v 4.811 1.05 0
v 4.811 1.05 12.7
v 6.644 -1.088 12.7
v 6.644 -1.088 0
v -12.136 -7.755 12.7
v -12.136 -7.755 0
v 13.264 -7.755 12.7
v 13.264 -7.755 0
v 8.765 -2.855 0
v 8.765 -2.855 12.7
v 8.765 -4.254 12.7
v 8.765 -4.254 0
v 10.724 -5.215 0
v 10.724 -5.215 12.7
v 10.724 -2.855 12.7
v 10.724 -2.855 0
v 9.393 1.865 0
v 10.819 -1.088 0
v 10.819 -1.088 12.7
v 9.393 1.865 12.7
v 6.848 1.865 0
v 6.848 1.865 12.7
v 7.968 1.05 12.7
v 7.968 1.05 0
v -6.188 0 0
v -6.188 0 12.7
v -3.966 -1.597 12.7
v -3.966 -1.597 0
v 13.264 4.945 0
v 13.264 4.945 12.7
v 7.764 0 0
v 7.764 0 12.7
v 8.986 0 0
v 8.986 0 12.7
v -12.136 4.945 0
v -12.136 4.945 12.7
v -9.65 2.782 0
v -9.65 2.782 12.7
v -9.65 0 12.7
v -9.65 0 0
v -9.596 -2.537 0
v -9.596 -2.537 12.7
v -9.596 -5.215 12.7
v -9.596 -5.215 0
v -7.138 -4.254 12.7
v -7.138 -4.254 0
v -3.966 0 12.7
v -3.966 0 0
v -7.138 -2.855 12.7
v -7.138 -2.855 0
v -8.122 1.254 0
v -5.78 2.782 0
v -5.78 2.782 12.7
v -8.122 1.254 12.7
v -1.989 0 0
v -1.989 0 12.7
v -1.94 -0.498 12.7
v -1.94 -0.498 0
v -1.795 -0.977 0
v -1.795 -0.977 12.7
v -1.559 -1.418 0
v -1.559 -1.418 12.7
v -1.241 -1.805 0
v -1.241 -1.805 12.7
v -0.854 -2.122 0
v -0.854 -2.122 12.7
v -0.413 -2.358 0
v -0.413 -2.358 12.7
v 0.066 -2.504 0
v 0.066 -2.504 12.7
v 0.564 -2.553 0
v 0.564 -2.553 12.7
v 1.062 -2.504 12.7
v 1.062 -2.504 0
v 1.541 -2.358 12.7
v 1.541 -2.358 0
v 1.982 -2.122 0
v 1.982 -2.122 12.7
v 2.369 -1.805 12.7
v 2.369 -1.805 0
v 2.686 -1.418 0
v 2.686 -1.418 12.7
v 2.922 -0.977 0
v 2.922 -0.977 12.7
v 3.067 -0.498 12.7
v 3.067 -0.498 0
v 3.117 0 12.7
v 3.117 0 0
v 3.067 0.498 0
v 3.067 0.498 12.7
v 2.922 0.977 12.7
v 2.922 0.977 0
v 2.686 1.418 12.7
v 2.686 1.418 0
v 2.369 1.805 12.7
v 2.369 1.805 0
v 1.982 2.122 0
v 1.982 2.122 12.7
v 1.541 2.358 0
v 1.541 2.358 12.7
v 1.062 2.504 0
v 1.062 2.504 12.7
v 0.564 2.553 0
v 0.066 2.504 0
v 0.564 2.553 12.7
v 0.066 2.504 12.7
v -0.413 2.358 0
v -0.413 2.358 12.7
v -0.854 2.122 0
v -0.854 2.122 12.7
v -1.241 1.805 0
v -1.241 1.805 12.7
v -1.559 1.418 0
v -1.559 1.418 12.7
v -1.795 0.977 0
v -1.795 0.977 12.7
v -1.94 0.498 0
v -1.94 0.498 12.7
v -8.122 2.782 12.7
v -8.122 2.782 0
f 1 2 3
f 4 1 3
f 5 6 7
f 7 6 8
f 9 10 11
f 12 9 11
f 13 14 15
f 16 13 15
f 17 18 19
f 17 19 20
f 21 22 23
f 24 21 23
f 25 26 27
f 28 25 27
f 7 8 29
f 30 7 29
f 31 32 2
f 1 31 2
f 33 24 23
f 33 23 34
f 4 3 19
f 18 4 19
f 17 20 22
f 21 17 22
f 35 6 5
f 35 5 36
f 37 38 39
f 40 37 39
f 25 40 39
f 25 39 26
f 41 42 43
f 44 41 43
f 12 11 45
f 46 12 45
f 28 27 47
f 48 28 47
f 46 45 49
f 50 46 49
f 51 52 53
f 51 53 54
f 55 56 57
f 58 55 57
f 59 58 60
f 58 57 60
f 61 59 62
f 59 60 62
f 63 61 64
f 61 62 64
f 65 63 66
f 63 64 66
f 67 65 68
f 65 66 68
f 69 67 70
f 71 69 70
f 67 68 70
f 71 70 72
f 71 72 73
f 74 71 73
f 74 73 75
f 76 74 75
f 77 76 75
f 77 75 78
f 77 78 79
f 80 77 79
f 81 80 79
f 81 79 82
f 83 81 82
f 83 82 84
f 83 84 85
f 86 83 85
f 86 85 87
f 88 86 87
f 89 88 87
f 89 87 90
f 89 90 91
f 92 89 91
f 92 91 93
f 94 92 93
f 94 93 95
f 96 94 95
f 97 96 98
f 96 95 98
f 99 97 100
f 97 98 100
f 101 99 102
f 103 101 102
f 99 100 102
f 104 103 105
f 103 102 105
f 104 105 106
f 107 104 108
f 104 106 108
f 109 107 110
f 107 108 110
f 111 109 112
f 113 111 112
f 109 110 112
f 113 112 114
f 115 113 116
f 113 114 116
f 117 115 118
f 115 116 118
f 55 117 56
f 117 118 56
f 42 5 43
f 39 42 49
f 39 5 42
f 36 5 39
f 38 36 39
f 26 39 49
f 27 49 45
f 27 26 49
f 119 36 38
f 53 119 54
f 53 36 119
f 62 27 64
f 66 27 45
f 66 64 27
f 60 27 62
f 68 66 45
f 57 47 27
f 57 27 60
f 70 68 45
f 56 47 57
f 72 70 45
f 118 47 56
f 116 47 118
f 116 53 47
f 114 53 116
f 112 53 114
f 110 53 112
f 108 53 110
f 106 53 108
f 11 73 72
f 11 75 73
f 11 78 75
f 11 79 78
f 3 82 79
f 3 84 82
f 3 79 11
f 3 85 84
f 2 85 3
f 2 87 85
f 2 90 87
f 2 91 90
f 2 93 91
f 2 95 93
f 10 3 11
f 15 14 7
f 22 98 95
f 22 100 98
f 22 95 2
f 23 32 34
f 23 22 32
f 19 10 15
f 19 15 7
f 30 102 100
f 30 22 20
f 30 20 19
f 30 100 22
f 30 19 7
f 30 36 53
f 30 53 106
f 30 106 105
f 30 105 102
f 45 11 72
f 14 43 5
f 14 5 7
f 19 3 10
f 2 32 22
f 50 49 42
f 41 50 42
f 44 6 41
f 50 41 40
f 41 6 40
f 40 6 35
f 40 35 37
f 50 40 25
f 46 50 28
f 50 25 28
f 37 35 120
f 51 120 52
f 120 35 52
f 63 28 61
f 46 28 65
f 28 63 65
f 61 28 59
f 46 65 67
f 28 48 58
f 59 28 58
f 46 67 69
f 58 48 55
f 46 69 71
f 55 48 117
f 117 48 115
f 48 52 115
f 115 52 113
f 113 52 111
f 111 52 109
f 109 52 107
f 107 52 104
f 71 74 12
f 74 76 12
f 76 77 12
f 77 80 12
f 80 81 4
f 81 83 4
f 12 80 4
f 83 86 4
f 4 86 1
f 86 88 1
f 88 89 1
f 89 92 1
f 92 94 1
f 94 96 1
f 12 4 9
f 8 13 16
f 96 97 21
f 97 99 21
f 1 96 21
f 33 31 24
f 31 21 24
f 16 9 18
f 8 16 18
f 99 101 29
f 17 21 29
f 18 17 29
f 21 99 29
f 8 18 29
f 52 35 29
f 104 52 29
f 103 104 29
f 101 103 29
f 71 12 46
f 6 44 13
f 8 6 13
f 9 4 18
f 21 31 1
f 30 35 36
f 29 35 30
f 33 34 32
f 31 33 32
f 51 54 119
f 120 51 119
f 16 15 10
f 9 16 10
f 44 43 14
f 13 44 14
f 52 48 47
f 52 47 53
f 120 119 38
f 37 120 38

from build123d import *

# Parameters (mm, degrees)
F0_W     = 25.4
F0_H     = 12.7
F1_DEPTH = 12.7
F3_D     = 5.1054
F5_DEPTH = 25.4
F7_DEPTH = 25.4
F9_DEPTH = 25.4


with BuildPart() as f1:
    # F0 (on Top) → F1 (new body)
    with BuildSketch(Plane.XY):
        with Locations((0.563834, -1.404666)):
            Rectangle(F0_W, F0_H)
    extrude(amount=F1_DEPTH)

    # F3 (through all)
    with Locations(Plane(origin=(0, 0, 0), x_dir=(1, 0, 0), z_dir=(0, 0, -1))):
        with Locations((0.563834, 0)):
            Hole(F3_D / 2)

    # F4 (on face) → F5 (cut)
    with BuildSketch(Plane.XY.offset(12.7)):
        Polygon((-9.596166, -2.537197), (-9.596166, -5.214666), (10.723834, -5.214666), (10.723834, -2.854676), (8.765497, -2.854676), (8.765497, -4.253724), (-7.137803, -4.253724), (-7.137803, -2.854676), align=None)
    extrude(amount=-F5_DEPTH, mode=Mode.SUBTRACT)

    # F6 (on face) → F7 (cut)
    with BuildSketch(Plane.XY.offset(12.7)):
        Polygon((-9.650016, 2.781621), (-9.650016, 0), (-6.187561, 0), (-3.966114, -1.597365), (-3.966114, 0), (-5.780214, 2.781621), (-8.122463, 1.254068), (-8.122463, 2.781621), align=None)
    extrude(amount=-F7_DEPTH, mode=Mode.SUBTRACT)

    # F8 (on face) → F9 (cut)
    with BuildSketch(Plane.XY.offset(12.7)):
        Polygon((9.393484, 1.865089), (6.847562, 1.865089), (7.967768, 1.050394), (8.986138, 0), (7.764094, 0), (4.810824, 1.050394), (6.643889, -1.088181), (10.819201, -1.088181), align=None)
    extrude(amount=-F9_DEPTH, mode=Mode.SUBTRACT)


solid = f1.part
